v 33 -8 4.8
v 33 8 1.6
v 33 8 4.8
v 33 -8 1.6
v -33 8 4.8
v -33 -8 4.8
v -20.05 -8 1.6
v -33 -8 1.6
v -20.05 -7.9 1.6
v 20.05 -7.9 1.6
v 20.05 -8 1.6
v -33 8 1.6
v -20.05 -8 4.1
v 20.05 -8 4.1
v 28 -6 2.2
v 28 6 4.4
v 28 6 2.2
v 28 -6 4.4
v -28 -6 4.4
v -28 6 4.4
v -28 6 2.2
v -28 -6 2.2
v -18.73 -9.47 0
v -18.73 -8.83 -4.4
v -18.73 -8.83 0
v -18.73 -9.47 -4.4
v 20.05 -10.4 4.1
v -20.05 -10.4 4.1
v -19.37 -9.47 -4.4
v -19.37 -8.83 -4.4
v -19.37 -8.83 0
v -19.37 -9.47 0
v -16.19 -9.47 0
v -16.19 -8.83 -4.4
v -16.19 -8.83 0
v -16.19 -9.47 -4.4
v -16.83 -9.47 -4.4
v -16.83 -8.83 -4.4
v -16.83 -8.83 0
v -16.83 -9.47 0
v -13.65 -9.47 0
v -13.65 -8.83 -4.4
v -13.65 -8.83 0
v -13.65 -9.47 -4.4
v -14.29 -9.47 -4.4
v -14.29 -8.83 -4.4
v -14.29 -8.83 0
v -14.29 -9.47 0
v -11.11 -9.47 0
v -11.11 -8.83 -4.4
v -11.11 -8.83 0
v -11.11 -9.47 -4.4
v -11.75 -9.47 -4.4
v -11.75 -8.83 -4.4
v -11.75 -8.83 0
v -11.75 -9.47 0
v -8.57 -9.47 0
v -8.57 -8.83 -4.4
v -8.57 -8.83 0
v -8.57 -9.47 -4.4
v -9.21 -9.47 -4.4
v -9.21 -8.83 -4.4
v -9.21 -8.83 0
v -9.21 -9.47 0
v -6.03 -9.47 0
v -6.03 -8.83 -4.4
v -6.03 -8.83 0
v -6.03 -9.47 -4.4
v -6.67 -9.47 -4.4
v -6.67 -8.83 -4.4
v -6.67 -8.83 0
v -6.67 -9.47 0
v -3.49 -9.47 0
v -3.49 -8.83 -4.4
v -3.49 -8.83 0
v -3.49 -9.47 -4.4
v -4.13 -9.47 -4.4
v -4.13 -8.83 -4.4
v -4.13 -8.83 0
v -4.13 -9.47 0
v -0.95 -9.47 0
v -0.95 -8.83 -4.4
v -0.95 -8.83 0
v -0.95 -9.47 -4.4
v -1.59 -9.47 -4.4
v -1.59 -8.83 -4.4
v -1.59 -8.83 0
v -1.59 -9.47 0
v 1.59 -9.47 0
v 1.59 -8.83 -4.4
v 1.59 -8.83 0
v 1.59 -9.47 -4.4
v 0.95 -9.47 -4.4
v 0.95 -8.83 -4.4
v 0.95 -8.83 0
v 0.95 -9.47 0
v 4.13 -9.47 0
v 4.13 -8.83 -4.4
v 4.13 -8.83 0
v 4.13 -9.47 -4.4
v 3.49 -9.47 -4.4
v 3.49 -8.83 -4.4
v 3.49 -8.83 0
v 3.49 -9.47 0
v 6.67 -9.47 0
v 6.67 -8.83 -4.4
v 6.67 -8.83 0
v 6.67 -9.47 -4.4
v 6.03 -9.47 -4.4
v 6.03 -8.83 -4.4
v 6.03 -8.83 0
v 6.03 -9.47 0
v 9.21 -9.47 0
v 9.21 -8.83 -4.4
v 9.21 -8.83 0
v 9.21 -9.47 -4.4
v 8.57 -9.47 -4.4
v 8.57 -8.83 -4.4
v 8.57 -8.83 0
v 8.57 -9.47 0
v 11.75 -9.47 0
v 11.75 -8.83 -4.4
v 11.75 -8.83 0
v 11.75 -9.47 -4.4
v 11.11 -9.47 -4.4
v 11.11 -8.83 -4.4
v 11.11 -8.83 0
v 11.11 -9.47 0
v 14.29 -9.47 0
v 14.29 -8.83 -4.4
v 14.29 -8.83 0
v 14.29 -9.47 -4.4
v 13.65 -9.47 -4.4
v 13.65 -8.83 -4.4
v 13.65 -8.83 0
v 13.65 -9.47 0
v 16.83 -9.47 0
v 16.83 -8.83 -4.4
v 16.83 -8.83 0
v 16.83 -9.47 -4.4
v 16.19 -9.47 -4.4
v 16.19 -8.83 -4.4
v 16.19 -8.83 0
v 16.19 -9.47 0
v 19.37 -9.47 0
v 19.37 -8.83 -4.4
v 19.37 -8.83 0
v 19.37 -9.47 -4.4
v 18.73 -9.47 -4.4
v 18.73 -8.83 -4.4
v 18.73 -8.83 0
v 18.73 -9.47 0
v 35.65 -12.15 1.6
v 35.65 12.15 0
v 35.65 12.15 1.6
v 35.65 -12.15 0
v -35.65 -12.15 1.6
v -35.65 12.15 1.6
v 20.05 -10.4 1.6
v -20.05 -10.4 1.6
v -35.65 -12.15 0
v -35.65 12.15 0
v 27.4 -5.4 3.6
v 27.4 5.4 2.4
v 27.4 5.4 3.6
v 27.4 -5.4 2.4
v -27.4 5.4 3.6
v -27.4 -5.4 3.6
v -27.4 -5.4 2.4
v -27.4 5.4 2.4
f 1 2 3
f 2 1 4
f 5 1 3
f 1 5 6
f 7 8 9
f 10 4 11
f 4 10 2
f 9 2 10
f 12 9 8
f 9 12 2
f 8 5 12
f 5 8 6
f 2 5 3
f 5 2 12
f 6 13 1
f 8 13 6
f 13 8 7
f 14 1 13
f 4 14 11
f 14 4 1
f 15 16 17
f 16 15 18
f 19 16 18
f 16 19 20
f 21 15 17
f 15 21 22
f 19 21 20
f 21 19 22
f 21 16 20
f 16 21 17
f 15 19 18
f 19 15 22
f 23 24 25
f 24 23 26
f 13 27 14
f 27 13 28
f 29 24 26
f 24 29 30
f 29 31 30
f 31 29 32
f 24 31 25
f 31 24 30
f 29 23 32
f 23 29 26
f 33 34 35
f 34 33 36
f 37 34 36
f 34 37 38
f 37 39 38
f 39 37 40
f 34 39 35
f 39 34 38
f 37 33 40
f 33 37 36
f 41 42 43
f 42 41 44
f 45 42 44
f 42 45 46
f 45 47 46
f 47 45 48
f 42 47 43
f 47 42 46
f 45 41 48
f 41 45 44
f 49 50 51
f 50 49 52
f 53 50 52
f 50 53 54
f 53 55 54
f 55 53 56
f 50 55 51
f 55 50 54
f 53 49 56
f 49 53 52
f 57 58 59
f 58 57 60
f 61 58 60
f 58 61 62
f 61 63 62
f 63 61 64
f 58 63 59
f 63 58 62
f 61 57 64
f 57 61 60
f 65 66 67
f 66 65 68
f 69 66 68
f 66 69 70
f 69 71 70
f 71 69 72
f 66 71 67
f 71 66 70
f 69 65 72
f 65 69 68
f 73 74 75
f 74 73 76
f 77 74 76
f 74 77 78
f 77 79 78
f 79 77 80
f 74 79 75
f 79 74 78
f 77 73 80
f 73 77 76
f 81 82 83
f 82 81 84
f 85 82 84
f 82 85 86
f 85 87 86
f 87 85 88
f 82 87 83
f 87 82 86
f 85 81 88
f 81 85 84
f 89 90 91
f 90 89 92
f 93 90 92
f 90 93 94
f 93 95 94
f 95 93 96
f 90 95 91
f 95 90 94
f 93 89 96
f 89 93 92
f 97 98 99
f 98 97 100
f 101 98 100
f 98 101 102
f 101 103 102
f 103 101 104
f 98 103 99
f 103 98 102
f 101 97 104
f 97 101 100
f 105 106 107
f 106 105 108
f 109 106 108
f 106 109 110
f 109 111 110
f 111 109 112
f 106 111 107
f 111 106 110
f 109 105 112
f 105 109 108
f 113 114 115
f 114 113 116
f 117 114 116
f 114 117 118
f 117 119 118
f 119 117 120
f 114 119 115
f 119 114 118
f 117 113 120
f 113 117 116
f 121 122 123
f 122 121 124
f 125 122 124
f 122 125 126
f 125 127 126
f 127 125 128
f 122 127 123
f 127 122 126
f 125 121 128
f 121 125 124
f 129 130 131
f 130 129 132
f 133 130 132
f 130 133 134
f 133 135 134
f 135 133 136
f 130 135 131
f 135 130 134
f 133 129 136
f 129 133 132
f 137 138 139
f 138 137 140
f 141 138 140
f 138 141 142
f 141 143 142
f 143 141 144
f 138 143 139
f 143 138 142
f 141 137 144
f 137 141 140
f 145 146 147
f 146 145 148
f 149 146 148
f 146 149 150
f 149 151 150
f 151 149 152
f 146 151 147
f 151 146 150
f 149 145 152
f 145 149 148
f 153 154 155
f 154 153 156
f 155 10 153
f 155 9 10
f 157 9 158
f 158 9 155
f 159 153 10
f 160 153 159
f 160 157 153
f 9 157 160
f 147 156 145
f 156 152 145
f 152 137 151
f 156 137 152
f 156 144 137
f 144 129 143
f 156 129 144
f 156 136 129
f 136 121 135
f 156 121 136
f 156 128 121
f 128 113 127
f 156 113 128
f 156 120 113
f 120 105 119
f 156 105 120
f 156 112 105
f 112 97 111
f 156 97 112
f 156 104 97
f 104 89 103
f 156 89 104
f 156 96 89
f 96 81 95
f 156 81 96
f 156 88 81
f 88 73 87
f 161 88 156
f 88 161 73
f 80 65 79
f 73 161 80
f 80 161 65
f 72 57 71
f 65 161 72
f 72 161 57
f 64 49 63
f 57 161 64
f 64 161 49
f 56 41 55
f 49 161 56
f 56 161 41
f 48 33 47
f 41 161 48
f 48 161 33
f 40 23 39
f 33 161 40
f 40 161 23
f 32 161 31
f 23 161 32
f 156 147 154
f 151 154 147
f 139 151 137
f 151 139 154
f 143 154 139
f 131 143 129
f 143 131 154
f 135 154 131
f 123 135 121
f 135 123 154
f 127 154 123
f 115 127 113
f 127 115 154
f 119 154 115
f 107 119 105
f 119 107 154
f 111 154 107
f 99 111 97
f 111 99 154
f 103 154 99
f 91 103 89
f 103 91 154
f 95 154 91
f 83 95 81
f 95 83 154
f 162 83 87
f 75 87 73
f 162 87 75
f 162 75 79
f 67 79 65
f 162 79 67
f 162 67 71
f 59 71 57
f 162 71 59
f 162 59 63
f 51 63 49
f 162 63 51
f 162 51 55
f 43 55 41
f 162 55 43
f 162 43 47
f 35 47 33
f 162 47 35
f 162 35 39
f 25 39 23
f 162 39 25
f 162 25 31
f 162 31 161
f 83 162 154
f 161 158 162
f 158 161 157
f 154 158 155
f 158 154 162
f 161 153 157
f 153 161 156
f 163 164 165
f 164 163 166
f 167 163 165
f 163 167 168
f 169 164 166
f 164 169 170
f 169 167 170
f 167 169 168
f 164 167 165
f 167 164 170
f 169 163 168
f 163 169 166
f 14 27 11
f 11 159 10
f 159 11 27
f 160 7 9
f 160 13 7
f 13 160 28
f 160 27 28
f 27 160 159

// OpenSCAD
$fn = 64;

// LCD 1602A display module (approx) 71.3mm x 24.3mm
// Simple renderable model: PCB + bezel/frame + display window + 16-pin header

module lcd1602a(
    pcb_x = 71.3,
    pcb_y = 24.3,
    pcb_t = 1.6,

    bezel_x = 66.0,
    bezel_y = 16.0,
    bezel_t = 3.2,
    bezel_z = 1.6,          // sits on top of PCB

    window_x = 56.0,
    window_y = 12.0,
    window_depth = 2.2,

    header_pins = 16,
    header_pitch = 2.54,
    header_pin_w = 0.64,
    header_pin_h = 6.0,
    header_body_h = 2.5,
    header_body_t = 2.5
) {
    // PCB
    color([0.05, 0.35, 0.12])
    translate([-pcb_x/2, -pcb_y/2, 0])
        cube([pcb_x, pcb_y, pcb_t], center=false);

    // Bezel/frame on top of PCB
    color([0.08, 0.08, 0.08])
    translate([0, 0, bezel_z])
    difference() {
        translate([-bezel_x/2, -bezel_y/2, 0])
            cube([bezel_x, bezel_y, bezel_t], center=false);

        // Window cutout
        translate([-window_x/2, -window_y/2, 0.6])
            cube([window_x, window_y, window_depth], center=false);
    }

    // Display glass (behind window)
    color([0.15, 0.25, 0.25, 0.85])
    translate([0, 0, bezel_z + 0.8])
        translate([-window_x/2 + 0.6, -window_y/2 + 0.6, 0])
            cube([window_x - 1.2, window_y - 1.2, 1.2], center=false);

    // 16-pin header along one long edge (typical)
    header_len = (header_pins - 1) * header_pitch;
    header_body_w = header_len + 2.0;
    header_body_d = header_body_t;

    // Place header near bottom edge of PCB
    header_y = -pcb_y/2 + 3.0;
    header_z = pcb_t;

    // Header plastic body
    color([0.05, 0.05, 0.05])
    translate([0, header_y, header_z])
        translate([-header_body_w/2, -header_body_d/2, 0])
            cube([header_body_w, header_body_d, header_body_h], center=false);

    // Pins
    color([0.75, 0.75, 0.78])
    for (i = [0:header_pins-1]) {
        x = -header_len/2 + i*header_pitch;
        translate([x, header_y, header_z])
            translate([-header_pin_w/2, -header_pin_w/2, -header_pin_h])
                cube([header_pin_w, header_pin_w, header_pin_h + header_body_h], center=false);
    }
}

lcd1602a();
